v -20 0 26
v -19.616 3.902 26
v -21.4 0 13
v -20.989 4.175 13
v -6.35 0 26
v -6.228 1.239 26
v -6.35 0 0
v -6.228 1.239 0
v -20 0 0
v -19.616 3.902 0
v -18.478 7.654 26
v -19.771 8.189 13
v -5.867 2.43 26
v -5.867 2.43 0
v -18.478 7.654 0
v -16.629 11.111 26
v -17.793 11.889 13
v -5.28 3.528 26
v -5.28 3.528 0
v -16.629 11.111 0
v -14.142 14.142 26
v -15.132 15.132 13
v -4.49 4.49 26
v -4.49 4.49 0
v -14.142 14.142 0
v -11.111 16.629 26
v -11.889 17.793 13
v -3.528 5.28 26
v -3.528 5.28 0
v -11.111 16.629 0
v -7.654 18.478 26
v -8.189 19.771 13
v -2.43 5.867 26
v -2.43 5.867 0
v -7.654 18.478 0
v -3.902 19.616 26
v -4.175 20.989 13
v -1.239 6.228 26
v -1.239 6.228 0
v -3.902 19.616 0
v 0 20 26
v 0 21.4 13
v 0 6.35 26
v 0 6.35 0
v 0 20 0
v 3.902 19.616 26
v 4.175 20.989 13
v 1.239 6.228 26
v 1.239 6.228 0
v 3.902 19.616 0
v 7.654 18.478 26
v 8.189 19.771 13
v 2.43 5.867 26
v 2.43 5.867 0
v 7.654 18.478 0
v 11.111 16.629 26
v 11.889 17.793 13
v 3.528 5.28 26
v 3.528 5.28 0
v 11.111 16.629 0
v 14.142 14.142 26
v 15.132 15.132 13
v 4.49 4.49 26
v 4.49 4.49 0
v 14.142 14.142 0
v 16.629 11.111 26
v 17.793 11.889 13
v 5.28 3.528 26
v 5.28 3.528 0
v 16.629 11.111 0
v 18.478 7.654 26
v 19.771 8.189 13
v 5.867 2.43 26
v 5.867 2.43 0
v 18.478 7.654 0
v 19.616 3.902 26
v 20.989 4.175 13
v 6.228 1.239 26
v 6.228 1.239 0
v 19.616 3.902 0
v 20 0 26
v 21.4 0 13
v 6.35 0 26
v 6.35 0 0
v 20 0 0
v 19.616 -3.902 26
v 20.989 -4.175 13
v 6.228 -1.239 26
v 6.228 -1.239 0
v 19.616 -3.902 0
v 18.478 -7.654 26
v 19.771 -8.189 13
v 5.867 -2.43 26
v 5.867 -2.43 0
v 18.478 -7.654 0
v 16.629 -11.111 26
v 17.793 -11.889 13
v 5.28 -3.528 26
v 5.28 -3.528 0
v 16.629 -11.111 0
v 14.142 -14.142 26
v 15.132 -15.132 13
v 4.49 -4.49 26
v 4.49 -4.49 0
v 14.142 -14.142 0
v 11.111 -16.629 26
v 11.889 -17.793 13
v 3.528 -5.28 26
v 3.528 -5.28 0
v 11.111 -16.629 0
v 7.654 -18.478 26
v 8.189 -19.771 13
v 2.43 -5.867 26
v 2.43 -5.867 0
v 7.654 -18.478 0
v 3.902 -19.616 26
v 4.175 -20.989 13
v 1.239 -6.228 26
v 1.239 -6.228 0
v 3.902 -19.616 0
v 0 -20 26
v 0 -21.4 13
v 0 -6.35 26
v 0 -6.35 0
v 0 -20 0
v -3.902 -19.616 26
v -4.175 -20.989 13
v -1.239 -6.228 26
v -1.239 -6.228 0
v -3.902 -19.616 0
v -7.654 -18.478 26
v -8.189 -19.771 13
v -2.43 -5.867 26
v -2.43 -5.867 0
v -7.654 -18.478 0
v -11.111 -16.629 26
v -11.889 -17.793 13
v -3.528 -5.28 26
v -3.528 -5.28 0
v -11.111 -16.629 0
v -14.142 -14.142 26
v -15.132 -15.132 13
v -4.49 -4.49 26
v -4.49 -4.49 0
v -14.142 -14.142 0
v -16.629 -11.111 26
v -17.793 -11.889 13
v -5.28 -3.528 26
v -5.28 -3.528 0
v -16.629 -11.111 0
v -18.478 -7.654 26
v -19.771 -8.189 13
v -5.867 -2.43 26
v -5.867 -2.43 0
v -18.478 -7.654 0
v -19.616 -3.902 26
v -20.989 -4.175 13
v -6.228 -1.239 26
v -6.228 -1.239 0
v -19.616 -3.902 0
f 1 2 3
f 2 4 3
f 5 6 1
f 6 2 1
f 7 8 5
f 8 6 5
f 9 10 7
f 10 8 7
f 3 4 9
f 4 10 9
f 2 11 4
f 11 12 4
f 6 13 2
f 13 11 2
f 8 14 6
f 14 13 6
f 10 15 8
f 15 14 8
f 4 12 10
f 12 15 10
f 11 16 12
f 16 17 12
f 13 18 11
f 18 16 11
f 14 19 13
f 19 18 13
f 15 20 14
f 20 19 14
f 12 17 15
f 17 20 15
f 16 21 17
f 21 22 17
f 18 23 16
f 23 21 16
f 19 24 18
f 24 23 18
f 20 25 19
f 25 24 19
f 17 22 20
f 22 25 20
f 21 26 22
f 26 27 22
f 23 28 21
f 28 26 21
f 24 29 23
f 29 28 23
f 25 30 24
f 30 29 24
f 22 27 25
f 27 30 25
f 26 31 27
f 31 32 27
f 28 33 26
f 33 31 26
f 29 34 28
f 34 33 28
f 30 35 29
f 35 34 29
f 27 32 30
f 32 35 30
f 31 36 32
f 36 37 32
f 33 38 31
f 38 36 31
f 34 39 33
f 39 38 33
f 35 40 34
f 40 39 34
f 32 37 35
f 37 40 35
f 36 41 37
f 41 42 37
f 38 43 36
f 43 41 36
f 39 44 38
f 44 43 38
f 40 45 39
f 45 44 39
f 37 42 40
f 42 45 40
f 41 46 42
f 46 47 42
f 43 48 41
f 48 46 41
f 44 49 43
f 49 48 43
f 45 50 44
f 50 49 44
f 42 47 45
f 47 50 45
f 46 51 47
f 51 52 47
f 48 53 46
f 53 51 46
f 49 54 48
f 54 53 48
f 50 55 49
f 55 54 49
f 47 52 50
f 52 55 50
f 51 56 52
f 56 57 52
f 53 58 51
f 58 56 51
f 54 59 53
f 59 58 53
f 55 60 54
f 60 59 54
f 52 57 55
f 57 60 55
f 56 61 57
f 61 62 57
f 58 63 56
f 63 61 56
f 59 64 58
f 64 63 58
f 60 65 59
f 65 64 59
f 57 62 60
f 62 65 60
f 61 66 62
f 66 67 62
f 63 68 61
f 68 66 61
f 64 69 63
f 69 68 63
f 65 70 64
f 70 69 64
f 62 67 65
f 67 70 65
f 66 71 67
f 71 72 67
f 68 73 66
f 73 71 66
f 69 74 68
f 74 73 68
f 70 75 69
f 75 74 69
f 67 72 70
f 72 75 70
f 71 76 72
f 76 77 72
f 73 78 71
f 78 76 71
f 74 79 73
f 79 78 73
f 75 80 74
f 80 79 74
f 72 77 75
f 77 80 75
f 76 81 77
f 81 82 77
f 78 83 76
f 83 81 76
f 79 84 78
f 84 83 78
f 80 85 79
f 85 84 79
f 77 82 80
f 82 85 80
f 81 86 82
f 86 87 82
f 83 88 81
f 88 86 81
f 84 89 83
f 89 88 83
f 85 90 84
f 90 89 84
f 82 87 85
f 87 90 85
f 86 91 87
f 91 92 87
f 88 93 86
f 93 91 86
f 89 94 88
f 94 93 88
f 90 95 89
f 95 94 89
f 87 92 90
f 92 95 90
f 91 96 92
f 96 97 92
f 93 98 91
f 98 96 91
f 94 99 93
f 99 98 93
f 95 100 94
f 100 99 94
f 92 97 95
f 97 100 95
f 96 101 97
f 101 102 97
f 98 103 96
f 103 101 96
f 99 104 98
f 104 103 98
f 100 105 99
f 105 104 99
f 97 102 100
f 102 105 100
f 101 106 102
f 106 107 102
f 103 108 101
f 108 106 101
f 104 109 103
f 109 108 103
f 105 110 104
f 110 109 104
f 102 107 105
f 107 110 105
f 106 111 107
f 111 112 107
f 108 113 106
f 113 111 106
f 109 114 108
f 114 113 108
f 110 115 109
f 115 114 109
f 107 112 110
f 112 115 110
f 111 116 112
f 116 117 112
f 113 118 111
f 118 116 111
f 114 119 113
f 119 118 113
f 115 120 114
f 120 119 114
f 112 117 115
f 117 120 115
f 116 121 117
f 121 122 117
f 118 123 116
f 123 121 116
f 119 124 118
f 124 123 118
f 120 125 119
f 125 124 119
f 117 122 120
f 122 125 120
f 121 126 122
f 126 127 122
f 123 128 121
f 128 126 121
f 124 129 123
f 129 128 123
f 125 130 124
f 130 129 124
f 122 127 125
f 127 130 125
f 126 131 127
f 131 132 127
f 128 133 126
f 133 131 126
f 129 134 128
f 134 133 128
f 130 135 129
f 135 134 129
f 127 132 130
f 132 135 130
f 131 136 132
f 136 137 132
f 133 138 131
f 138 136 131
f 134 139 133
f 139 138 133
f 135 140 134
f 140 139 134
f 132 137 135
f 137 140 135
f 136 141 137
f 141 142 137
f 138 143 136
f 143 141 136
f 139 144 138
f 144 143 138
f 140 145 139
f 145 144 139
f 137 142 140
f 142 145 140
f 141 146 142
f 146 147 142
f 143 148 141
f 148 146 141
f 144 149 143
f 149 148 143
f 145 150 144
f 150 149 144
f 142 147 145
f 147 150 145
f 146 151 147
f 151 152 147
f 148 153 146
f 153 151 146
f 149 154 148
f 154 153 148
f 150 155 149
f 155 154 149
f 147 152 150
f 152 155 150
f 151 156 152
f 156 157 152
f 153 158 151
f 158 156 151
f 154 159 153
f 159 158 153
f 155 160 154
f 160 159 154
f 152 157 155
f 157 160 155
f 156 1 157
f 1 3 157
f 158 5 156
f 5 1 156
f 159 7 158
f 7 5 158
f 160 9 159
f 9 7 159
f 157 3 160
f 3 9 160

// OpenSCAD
$fn = 32;

// ----------------------------------------------------------------------
// Belt roller: 40 mm barrel, 26 mm wide, bore 12.7 mm
// ----------------------------------------------------------------------

// --- parameters (mm) ---
bore_d = 12.7;            // bore
barrel_d = 40;            // barrel diameter
roller_w = 26;            // roller width
crown = 1.4;              // crown height at mid width

roller_profile = [[6.35, 0], [20, 0], [21.4, 13], [20, 26], [6.35, 26]];

/* the profile stays clear of the axis, so the bore comes out of the revolve */
rotate_extrude() polygon(roller_profile);
